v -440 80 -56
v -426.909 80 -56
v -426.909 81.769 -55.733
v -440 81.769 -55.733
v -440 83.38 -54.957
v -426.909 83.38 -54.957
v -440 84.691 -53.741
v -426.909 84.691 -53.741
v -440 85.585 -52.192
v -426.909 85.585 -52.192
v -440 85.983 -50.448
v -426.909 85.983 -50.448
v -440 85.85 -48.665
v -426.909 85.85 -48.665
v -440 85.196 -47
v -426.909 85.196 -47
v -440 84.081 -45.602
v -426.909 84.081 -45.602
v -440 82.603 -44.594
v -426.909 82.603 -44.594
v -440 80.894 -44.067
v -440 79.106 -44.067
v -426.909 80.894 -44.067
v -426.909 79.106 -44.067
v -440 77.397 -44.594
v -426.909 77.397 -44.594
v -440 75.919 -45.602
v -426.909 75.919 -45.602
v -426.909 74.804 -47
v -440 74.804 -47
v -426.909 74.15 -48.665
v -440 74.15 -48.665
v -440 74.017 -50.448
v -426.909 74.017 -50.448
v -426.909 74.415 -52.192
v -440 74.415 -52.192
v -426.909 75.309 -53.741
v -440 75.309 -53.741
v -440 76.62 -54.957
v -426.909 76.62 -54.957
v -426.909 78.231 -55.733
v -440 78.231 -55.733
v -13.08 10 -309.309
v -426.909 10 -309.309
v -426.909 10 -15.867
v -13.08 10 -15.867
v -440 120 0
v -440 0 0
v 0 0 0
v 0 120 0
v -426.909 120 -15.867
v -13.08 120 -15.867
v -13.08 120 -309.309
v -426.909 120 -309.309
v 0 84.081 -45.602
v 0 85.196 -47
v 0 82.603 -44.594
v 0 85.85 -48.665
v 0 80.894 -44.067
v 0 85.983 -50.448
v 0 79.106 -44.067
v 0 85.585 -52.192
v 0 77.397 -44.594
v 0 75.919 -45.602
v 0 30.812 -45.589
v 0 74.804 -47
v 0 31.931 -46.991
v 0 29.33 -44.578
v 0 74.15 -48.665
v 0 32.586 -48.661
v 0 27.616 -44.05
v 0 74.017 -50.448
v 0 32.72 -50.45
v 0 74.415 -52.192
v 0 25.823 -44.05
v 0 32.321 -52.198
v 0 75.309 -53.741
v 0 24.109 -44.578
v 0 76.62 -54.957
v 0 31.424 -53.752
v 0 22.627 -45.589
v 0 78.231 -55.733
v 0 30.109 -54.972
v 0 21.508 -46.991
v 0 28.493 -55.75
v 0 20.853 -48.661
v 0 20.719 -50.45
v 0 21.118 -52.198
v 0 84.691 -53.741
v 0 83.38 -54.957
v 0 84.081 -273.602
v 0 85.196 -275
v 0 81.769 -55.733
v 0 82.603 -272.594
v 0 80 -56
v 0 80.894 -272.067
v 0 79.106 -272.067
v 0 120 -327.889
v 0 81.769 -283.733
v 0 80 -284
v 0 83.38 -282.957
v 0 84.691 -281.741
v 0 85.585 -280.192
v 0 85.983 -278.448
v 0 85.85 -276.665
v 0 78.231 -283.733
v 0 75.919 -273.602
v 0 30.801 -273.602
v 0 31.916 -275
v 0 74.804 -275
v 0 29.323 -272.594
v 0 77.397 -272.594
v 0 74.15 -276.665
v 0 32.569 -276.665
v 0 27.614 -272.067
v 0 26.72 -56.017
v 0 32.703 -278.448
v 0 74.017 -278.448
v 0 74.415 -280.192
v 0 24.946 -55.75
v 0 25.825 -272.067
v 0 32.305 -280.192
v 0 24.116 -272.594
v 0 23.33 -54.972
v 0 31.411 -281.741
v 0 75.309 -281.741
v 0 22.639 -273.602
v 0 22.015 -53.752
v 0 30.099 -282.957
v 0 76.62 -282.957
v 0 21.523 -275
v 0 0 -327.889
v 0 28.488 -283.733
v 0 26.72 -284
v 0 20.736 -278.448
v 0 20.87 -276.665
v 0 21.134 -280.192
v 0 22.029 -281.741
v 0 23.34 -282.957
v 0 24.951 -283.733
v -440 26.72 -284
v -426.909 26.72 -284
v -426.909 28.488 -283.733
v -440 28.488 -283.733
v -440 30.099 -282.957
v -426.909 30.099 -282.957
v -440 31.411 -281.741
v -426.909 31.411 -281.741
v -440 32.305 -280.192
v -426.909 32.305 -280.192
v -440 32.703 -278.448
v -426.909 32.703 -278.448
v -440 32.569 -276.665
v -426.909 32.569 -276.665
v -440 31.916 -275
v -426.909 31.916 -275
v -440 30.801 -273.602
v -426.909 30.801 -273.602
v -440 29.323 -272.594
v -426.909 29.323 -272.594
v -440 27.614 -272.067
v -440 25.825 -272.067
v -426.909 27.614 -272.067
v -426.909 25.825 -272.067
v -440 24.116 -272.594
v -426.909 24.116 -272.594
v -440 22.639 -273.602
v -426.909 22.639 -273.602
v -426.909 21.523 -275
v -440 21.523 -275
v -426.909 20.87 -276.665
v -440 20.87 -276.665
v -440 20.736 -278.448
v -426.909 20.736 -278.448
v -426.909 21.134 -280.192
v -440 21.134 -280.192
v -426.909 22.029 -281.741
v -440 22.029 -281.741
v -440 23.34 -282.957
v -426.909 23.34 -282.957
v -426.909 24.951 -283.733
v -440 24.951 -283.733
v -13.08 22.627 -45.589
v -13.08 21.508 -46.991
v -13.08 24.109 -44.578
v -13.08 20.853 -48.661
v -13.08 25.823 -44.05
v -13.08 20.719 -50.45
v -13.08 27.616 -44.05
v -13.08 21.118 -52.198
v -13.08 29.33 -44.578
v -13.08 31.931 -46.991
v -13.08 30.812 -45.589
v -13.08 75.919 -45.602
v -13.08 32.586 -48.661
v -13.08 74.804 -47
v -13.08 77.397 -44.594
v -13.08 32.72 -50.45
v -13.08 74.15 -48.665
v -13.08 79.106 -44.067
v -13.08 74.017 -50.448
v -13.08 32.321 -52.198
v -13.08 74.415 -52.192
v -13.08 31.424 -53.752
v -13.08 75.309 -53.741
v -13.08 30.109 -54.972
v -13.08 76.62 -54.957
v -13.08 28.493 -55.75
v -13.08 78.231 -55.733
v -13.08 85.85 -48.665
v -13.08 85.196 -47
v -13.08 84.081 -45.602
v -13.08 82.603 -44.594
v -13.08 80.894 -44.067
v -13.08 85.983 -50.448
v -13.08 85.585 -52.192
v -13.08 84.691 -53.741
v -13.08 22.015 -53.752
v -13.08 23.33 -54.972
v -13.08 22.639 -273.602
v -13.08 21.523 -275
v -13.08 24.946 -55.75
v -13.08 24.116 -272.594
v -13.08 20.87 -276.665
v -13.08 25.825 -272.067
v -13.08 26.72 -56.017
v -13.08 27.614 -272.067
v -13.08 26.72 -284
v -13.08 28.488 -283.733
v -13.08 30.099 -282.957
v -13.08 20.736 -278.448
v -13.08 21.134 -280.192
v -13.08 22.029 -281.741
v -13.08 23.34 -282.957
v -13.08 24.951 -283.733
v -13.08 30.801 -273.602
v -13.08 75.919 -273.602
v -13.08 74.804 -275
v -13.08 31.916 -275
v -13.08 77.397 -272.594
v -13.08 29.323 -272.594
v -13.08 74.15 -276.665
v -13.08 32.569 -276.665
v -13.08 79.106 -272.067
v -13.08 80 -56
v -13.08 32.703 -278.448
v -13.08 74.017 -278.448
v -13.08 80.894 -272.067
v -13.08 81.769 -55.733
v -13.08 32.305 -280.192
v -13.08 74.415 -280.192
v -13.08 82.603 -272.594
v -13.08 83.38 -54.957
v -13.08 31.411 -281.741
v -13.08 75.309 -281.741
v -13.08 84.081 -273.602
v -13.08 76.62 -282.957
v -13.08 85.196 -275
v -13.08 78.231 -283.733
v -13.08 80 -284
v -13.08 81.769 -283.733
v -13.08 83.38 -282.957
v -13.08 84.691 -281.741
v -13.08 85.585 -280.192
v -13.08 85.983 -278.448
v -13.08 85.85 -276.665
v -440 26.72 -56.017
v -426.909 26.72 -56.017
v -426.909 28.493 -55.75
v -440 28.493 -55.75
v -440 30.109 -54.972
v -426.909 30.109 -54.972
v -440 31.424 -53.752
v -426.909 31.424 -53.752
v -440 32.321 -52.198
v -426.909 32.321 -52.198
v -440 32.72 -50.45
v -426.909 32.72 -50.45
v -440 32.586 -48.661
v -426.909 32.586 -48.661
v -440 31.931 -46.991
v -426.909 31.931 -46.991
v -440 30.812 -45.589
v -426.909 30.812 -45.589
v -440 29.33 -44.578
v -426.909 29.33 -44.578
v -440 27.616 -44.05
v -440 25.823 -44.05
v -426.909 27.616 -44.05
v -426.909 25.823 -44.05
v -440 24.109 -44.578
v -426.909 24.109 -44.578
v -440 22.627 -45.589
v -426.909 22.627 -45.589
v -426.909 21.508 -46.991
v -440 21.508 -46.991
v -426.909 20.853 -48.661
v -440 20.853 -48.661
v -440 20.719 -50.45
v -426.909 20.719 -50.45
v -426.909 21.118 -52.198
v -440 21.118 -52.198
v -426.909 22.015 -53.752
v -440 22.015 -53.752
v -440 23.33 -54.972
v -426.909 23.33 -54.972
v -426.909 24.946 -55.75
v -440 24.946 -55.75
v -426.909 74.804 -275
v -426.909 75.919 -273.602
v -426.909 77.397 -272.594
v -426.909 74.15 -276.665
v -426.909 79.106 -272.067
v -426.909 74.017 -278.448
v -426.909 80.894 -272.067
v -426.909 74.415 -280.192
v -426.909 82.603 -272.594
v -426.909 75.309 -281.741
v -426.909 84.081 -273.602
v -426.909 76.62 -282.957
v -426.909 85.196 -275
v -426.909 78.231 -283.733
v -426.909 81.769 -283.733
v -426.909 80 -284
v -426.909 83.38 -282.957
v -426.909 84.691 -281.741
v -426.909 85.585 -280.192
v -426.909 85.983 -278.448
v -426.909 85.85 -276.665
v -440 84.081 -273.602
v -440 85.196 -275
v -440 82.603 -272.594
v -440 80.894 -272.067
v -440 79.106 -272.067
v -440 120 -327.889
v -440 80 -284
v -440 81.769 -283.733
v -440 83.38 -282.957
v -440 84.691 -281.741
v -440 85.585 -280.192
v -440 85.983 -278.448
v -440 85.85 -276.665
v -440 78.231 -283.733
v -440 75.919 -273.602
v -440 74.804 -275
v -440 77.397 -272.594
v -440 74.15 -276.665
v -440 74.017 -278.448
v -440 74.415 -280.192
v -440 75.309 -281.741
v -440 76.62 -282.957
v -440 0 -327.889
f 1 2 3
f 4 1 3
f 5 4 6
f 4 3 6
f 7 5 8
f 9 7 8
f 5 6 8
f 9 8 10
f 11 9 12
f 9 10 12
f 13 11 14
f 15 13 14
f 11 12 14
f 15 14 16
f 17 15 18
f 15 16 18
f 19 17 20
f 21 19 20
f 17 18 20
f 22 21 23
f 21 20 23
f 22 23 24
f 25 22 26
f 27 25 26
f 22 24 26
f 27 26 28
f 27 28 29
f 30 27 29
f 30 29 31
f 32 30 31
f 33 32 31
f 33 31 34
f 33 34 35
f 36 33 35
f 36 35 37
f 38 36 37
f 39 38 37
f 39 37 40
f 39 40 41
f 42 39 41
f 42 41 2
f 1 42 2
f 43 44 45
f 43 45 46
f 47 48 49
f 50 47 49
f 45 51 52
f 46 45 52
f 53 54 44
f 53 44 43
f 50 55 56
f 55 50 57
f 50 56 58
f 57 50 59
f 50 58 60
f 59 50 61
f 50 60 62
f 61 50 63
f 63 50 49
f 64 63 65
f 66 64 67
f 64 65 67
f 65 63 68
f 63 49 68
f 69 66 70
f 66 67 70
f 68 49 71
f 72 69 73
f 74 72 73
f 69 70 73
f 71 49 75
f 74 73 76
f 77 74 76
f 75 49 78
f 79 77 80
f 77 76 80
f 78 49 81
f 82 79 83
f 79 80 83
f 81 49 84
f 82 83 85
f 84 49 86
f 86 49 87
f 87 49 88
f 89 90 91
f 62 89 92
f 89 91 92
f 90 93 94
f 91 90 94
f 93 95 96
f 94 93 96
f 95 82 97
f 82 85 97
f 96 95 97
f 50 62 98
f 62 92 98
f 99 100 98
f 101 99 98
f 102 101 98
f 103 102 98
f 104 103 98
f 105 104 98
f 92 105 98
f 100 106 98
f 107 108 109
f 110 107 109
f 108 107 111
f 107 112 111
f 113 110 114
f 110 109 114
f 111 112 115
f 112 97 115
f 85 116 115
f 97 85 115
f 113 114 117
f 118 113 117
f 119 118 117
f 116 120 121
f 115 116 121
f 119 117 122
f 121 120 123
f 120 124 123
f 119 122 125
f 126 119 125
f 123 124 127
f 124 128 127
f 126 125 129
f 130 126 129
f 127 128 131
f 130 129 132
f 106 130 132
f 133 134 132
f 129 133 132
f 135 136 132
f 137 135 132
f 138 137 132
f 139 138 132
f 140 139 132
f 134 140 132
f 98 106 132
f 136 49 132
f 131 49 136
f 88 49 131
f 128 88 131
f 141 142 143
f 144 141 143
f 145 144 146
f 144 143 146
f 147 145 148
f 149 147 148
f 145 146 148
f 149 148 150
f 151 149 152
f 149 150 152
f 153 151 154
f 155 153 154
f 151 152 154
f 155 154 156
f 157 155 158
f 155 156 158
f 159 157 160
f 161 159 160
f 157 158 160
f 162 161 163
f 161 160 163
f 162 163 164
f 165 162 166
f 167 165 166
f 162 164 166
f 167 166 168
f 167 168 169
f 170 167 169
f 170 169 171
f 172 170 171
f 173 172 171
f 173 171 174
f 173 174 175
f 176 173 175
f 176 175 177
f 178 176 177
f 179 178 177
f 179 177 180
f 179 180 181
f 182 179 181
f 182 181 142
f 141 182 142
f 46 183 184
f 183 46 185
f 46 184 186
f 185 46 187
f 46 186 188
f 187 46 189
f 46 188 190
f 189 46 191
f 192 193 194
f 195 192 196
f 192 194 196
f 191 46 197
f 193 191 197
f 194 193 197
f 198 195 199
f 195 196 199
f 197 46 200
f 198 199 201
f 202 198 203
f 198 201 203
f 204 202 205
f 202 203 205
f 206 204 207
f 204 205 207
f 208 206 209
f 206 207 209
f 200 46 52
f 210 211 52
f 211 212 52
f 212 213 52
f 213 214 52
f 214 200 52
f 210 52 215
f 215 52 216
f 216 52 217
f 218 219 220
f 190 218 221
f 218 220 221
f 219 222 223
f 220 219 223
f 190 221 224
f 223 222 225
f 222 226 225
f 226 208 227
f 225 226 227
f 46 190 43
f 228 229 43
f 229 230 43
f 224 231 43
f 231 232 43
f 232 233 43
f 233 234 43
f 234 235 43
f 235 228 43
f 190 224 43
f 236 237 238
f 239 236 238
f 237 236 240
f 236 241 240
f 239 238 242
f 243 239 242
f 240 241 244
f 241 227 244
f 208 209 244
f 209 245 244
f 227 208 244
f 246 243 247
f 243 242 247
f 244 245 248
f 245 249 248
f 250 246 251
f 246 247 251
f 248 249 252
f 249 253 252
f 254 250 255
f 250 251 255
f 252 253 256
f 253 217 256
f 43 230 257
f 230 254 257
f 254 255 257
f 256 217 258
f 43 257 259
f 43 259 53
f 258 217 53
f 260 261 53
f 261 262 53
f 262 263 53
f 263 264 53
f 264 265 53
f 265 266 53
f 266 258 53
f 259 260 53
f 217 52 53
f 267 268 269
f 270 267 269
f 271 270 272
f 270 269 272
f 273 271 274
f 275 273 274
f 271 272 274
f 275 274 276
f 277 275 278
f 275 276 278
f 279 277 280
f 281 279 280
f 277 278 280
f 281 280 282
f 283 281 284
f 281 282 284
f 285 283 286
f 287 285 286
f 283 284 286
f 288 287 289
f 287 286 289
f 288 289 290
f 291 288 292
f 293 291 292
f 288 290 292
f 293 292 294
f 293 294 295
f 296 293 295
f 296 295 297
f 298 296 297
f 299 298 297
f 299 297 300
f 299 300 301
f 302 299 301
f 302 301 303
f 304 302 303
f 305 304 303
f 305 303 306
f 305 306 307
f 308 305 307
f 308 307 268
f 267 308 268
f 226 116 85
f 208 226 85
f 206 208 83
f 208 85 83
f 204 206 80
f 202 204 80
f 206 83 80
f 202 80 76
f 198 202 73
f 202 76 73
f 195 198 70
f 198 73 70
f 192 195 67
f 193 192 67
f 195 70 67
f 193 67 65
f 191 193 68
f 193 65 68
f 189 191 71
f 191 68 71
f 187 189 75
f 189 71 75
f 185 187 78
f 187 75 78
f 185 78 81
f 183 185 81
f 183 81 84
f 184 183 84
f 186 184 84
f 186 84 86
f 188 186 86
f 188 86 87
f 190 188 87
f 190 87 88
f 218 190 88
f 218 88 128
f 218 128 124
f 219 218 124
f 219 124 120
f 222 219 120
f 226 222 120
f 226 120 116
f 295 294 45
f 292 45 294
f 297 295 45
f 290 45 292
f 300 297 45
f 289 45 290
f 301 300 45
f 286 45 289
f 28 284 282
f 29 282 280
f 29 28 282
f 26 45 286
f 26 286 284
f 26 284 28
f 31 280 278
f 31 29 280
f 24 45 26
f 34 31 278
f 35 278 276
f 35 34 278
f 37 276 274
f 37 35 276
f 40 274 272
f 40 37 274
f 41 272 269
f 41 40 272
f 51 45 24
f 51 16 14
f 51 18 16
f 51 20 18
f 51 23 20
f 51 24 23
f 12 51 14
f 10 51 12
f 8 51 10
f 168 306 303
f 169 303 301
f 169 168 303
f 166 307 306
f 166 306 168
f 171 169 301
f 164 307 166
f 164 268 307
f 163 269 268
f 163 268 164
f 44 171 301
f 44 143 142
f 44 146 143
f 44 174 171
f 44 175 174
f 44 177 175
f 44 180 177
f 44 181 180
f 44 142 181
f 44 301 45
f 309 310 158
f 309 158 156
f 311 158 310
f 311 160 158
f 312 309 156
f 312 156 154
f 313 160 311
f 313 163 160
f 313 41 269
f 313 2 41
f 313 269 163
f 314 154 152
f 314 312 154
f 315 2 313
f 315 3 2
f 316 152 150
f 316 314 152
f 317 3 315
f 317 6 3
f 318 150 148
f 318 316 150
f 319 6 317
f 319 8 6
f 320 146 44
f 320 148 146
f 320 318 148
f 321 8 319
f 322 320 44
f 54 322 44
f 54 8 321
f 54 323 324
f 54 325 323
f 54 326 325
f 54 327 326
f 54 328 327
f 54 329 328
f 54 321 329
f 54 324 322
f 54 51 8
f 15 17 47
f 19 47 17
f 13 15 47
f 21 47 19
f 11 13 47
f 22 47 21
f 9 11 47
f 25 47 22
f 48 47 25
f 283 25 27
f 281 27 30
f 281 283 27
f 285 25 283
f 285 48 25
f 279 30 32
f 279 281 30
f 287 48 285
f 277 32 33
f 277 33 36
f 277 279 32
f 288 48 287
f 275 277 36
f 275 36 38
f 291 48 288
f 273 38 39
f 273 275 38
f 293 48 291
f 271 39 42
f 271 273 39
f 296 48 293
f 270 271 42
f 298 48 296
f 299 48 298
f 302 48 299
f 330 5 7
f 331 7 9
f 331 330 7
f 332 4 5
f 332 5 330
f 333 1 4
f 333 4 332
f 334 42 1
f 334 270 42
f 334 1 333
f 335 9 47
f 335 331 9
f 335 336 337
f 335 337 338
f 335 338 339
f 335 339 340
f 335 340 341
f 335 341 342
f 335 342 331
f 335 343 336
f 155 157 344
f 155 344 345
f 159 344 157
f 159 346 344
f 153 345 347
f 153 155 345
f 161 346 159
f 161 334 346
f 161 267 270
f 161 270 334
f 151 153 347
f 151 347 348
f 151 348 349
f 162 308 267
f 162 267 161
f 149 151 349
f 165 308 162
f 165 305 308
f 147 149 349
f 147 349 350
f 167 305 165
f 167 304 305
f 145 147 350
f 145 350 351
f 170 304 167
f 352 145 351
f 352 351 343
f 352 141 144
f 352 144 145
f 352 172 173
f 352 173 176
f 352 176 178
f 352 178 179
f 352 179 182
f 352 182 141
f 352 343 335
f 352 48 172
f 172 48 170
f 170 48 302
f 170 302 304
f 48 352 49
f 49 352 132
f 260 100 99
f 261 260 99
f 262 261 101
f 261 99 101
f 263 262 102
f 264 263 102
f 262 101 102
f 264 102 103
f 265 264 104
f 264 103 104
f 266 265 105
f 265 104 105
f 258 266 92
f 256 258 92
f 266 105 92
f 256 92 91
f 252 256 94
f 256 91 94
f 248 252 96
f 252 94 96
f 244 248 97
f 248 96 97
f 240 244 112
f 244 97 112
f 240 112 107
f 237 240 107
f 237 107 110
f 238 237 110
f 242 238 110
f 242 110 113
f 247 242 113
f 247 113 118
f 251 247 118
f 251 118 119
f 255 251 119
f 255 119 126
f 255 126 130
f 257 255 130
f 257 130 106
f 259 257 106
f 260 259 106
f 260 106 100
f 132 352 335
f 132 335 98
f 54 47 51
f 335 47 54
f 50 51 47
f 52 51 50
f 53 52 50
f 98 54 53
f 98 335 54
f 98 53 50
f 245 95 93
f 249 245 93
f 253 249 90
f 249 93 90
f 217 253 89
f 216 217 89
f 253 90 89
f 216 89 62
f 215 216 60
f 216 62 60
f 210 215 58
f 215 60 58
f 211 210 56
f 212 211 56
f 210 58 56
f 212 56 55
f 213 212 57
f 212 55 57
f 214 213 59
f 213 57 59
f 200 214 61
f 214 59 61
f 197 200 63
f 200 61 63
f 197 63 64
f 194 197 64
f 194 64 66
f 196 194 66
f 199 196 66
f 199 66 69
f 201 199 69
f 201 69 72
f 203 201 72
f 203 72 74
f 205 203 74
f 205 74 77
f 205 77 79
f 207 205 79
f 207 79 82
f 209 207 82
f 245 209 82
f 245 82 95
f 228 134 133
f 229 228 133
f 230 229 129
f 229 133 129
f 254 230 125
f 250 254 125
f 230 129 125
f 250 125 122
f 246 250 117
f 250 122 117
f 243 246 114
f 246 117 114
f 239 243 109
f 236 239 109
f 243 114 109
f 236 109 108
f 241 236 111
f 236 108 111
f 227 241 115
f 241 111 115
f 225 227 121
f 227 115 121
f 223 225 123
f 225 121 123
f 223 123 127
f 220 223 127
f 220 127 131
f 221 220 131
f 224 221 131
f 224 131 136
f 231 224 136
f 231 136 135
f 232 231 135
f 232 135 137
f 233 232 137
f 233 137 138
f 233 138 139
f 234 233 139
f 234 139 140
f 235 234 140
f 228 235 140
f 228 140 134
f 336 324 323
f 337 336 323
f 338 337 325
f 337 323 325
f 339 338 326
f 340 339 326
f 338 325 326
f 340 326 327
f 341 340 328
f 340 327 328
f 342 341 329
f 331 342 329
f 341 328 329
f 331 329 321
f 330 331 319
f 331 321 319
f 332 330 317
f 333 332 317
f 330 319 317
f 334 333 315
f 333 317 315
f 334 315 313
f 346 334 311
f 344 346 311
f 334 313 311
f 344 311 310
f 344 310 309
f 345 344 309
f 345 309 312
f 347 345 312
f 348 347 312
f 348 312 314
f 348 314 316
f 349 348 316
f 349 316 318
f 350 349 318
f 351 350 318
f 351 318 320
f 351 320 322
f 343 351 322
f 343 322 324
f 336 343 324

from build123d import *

# Parameters (mm, degrees)
SKETCH1_W           = 440
SKETCH1_H           = 327.889328918
BOSS_EXTRUDE1_DEPTH = 120
SKETCH8_W           = 413.828334862
SKETCH8_H           = 293.441910175
CUT_EXTRUDE1_DEPTH  = 110
SKETCH9_R           = 6
SKETCH9_R_2         = 6.017467881
CUT_EXTRUDE4_DEPTH  = 110
SKETCH10_R          = 6
SKETCH10_R_2        = 6.017467881
CUT_EXTRUDE5_DEPTH  = 110


with BuildPart() as part:
    # Sketch1 → Boss-Extrude1 (new body)
    with BuildSketch(Plane(origin=(0, 0, 0), x_dir=(1, 0, 0), z_dir=(0, 1, 0))):
        with Locations((-220, 163.944664459)):
            Rectangle(SKETCH1_W, SKETCH1_H)
    extrude(amount=BOSS_EXTRUDE1_DEPTH)

    # Sketch8 → Cut-Extrude1 (cut)
    with BuildSketch(Plane(origin=(0, 120, 0), x_dir=(1, 0, 0), z_dir=(0, 1, 0))):
        with Locations((-219.994628395, 162.587971533)):
            Rectangle(SKETCH8_W, SKETCH8_H)
    extrude(amount=-CUT_EXTRUDE1_DEPTH, mode=Mode.SUBTRACT)

    # Sketch9 → Cut-Extrude4 (cut)
    with BuildSketch(Plane(origin=(-426.908795826, 0, 0), x_dir=(0, 0, -1), z_dir=(1, 0, 0))):
        with Locations((278, 80)):
            Circle(SKETCH9_R)
        with Locations((278, 26.719560601)):
            Circle(SKETCH9_R)
        with Locations((50, 80)):
            Circle(SKETCH9_R)
        with Locations((50, 26.719560601)):
            Circle(SKETCH9_R_2)
    extrude(amount=-CUT_EXTRUDE4_DEPTH, mode=Mode.SUBTRACT)

    # Sketch10 → Cut-Extrude5 (cut)
    with BuildSketch(Plane(origin=(0, 0, 0), x_dir=(0, 0, -1), z_dir=(1, 0, 0))):
        with Locations((50, 80)):
            Circle(SKETCH10_R)
        with Locations((50, 26.719560601)):
            Circle(SKETCH10_R_2)
        with Locations((278, 26.719560601)):
            Circle(SKETCH10_R)
        with Locations((278, 80)):
            Circle(SKETCH10_R)
    extrude(amount=-CUT_EXTRUDE5_DEPTH, mode=Mode.SUBTRACT)


solid = part.part
